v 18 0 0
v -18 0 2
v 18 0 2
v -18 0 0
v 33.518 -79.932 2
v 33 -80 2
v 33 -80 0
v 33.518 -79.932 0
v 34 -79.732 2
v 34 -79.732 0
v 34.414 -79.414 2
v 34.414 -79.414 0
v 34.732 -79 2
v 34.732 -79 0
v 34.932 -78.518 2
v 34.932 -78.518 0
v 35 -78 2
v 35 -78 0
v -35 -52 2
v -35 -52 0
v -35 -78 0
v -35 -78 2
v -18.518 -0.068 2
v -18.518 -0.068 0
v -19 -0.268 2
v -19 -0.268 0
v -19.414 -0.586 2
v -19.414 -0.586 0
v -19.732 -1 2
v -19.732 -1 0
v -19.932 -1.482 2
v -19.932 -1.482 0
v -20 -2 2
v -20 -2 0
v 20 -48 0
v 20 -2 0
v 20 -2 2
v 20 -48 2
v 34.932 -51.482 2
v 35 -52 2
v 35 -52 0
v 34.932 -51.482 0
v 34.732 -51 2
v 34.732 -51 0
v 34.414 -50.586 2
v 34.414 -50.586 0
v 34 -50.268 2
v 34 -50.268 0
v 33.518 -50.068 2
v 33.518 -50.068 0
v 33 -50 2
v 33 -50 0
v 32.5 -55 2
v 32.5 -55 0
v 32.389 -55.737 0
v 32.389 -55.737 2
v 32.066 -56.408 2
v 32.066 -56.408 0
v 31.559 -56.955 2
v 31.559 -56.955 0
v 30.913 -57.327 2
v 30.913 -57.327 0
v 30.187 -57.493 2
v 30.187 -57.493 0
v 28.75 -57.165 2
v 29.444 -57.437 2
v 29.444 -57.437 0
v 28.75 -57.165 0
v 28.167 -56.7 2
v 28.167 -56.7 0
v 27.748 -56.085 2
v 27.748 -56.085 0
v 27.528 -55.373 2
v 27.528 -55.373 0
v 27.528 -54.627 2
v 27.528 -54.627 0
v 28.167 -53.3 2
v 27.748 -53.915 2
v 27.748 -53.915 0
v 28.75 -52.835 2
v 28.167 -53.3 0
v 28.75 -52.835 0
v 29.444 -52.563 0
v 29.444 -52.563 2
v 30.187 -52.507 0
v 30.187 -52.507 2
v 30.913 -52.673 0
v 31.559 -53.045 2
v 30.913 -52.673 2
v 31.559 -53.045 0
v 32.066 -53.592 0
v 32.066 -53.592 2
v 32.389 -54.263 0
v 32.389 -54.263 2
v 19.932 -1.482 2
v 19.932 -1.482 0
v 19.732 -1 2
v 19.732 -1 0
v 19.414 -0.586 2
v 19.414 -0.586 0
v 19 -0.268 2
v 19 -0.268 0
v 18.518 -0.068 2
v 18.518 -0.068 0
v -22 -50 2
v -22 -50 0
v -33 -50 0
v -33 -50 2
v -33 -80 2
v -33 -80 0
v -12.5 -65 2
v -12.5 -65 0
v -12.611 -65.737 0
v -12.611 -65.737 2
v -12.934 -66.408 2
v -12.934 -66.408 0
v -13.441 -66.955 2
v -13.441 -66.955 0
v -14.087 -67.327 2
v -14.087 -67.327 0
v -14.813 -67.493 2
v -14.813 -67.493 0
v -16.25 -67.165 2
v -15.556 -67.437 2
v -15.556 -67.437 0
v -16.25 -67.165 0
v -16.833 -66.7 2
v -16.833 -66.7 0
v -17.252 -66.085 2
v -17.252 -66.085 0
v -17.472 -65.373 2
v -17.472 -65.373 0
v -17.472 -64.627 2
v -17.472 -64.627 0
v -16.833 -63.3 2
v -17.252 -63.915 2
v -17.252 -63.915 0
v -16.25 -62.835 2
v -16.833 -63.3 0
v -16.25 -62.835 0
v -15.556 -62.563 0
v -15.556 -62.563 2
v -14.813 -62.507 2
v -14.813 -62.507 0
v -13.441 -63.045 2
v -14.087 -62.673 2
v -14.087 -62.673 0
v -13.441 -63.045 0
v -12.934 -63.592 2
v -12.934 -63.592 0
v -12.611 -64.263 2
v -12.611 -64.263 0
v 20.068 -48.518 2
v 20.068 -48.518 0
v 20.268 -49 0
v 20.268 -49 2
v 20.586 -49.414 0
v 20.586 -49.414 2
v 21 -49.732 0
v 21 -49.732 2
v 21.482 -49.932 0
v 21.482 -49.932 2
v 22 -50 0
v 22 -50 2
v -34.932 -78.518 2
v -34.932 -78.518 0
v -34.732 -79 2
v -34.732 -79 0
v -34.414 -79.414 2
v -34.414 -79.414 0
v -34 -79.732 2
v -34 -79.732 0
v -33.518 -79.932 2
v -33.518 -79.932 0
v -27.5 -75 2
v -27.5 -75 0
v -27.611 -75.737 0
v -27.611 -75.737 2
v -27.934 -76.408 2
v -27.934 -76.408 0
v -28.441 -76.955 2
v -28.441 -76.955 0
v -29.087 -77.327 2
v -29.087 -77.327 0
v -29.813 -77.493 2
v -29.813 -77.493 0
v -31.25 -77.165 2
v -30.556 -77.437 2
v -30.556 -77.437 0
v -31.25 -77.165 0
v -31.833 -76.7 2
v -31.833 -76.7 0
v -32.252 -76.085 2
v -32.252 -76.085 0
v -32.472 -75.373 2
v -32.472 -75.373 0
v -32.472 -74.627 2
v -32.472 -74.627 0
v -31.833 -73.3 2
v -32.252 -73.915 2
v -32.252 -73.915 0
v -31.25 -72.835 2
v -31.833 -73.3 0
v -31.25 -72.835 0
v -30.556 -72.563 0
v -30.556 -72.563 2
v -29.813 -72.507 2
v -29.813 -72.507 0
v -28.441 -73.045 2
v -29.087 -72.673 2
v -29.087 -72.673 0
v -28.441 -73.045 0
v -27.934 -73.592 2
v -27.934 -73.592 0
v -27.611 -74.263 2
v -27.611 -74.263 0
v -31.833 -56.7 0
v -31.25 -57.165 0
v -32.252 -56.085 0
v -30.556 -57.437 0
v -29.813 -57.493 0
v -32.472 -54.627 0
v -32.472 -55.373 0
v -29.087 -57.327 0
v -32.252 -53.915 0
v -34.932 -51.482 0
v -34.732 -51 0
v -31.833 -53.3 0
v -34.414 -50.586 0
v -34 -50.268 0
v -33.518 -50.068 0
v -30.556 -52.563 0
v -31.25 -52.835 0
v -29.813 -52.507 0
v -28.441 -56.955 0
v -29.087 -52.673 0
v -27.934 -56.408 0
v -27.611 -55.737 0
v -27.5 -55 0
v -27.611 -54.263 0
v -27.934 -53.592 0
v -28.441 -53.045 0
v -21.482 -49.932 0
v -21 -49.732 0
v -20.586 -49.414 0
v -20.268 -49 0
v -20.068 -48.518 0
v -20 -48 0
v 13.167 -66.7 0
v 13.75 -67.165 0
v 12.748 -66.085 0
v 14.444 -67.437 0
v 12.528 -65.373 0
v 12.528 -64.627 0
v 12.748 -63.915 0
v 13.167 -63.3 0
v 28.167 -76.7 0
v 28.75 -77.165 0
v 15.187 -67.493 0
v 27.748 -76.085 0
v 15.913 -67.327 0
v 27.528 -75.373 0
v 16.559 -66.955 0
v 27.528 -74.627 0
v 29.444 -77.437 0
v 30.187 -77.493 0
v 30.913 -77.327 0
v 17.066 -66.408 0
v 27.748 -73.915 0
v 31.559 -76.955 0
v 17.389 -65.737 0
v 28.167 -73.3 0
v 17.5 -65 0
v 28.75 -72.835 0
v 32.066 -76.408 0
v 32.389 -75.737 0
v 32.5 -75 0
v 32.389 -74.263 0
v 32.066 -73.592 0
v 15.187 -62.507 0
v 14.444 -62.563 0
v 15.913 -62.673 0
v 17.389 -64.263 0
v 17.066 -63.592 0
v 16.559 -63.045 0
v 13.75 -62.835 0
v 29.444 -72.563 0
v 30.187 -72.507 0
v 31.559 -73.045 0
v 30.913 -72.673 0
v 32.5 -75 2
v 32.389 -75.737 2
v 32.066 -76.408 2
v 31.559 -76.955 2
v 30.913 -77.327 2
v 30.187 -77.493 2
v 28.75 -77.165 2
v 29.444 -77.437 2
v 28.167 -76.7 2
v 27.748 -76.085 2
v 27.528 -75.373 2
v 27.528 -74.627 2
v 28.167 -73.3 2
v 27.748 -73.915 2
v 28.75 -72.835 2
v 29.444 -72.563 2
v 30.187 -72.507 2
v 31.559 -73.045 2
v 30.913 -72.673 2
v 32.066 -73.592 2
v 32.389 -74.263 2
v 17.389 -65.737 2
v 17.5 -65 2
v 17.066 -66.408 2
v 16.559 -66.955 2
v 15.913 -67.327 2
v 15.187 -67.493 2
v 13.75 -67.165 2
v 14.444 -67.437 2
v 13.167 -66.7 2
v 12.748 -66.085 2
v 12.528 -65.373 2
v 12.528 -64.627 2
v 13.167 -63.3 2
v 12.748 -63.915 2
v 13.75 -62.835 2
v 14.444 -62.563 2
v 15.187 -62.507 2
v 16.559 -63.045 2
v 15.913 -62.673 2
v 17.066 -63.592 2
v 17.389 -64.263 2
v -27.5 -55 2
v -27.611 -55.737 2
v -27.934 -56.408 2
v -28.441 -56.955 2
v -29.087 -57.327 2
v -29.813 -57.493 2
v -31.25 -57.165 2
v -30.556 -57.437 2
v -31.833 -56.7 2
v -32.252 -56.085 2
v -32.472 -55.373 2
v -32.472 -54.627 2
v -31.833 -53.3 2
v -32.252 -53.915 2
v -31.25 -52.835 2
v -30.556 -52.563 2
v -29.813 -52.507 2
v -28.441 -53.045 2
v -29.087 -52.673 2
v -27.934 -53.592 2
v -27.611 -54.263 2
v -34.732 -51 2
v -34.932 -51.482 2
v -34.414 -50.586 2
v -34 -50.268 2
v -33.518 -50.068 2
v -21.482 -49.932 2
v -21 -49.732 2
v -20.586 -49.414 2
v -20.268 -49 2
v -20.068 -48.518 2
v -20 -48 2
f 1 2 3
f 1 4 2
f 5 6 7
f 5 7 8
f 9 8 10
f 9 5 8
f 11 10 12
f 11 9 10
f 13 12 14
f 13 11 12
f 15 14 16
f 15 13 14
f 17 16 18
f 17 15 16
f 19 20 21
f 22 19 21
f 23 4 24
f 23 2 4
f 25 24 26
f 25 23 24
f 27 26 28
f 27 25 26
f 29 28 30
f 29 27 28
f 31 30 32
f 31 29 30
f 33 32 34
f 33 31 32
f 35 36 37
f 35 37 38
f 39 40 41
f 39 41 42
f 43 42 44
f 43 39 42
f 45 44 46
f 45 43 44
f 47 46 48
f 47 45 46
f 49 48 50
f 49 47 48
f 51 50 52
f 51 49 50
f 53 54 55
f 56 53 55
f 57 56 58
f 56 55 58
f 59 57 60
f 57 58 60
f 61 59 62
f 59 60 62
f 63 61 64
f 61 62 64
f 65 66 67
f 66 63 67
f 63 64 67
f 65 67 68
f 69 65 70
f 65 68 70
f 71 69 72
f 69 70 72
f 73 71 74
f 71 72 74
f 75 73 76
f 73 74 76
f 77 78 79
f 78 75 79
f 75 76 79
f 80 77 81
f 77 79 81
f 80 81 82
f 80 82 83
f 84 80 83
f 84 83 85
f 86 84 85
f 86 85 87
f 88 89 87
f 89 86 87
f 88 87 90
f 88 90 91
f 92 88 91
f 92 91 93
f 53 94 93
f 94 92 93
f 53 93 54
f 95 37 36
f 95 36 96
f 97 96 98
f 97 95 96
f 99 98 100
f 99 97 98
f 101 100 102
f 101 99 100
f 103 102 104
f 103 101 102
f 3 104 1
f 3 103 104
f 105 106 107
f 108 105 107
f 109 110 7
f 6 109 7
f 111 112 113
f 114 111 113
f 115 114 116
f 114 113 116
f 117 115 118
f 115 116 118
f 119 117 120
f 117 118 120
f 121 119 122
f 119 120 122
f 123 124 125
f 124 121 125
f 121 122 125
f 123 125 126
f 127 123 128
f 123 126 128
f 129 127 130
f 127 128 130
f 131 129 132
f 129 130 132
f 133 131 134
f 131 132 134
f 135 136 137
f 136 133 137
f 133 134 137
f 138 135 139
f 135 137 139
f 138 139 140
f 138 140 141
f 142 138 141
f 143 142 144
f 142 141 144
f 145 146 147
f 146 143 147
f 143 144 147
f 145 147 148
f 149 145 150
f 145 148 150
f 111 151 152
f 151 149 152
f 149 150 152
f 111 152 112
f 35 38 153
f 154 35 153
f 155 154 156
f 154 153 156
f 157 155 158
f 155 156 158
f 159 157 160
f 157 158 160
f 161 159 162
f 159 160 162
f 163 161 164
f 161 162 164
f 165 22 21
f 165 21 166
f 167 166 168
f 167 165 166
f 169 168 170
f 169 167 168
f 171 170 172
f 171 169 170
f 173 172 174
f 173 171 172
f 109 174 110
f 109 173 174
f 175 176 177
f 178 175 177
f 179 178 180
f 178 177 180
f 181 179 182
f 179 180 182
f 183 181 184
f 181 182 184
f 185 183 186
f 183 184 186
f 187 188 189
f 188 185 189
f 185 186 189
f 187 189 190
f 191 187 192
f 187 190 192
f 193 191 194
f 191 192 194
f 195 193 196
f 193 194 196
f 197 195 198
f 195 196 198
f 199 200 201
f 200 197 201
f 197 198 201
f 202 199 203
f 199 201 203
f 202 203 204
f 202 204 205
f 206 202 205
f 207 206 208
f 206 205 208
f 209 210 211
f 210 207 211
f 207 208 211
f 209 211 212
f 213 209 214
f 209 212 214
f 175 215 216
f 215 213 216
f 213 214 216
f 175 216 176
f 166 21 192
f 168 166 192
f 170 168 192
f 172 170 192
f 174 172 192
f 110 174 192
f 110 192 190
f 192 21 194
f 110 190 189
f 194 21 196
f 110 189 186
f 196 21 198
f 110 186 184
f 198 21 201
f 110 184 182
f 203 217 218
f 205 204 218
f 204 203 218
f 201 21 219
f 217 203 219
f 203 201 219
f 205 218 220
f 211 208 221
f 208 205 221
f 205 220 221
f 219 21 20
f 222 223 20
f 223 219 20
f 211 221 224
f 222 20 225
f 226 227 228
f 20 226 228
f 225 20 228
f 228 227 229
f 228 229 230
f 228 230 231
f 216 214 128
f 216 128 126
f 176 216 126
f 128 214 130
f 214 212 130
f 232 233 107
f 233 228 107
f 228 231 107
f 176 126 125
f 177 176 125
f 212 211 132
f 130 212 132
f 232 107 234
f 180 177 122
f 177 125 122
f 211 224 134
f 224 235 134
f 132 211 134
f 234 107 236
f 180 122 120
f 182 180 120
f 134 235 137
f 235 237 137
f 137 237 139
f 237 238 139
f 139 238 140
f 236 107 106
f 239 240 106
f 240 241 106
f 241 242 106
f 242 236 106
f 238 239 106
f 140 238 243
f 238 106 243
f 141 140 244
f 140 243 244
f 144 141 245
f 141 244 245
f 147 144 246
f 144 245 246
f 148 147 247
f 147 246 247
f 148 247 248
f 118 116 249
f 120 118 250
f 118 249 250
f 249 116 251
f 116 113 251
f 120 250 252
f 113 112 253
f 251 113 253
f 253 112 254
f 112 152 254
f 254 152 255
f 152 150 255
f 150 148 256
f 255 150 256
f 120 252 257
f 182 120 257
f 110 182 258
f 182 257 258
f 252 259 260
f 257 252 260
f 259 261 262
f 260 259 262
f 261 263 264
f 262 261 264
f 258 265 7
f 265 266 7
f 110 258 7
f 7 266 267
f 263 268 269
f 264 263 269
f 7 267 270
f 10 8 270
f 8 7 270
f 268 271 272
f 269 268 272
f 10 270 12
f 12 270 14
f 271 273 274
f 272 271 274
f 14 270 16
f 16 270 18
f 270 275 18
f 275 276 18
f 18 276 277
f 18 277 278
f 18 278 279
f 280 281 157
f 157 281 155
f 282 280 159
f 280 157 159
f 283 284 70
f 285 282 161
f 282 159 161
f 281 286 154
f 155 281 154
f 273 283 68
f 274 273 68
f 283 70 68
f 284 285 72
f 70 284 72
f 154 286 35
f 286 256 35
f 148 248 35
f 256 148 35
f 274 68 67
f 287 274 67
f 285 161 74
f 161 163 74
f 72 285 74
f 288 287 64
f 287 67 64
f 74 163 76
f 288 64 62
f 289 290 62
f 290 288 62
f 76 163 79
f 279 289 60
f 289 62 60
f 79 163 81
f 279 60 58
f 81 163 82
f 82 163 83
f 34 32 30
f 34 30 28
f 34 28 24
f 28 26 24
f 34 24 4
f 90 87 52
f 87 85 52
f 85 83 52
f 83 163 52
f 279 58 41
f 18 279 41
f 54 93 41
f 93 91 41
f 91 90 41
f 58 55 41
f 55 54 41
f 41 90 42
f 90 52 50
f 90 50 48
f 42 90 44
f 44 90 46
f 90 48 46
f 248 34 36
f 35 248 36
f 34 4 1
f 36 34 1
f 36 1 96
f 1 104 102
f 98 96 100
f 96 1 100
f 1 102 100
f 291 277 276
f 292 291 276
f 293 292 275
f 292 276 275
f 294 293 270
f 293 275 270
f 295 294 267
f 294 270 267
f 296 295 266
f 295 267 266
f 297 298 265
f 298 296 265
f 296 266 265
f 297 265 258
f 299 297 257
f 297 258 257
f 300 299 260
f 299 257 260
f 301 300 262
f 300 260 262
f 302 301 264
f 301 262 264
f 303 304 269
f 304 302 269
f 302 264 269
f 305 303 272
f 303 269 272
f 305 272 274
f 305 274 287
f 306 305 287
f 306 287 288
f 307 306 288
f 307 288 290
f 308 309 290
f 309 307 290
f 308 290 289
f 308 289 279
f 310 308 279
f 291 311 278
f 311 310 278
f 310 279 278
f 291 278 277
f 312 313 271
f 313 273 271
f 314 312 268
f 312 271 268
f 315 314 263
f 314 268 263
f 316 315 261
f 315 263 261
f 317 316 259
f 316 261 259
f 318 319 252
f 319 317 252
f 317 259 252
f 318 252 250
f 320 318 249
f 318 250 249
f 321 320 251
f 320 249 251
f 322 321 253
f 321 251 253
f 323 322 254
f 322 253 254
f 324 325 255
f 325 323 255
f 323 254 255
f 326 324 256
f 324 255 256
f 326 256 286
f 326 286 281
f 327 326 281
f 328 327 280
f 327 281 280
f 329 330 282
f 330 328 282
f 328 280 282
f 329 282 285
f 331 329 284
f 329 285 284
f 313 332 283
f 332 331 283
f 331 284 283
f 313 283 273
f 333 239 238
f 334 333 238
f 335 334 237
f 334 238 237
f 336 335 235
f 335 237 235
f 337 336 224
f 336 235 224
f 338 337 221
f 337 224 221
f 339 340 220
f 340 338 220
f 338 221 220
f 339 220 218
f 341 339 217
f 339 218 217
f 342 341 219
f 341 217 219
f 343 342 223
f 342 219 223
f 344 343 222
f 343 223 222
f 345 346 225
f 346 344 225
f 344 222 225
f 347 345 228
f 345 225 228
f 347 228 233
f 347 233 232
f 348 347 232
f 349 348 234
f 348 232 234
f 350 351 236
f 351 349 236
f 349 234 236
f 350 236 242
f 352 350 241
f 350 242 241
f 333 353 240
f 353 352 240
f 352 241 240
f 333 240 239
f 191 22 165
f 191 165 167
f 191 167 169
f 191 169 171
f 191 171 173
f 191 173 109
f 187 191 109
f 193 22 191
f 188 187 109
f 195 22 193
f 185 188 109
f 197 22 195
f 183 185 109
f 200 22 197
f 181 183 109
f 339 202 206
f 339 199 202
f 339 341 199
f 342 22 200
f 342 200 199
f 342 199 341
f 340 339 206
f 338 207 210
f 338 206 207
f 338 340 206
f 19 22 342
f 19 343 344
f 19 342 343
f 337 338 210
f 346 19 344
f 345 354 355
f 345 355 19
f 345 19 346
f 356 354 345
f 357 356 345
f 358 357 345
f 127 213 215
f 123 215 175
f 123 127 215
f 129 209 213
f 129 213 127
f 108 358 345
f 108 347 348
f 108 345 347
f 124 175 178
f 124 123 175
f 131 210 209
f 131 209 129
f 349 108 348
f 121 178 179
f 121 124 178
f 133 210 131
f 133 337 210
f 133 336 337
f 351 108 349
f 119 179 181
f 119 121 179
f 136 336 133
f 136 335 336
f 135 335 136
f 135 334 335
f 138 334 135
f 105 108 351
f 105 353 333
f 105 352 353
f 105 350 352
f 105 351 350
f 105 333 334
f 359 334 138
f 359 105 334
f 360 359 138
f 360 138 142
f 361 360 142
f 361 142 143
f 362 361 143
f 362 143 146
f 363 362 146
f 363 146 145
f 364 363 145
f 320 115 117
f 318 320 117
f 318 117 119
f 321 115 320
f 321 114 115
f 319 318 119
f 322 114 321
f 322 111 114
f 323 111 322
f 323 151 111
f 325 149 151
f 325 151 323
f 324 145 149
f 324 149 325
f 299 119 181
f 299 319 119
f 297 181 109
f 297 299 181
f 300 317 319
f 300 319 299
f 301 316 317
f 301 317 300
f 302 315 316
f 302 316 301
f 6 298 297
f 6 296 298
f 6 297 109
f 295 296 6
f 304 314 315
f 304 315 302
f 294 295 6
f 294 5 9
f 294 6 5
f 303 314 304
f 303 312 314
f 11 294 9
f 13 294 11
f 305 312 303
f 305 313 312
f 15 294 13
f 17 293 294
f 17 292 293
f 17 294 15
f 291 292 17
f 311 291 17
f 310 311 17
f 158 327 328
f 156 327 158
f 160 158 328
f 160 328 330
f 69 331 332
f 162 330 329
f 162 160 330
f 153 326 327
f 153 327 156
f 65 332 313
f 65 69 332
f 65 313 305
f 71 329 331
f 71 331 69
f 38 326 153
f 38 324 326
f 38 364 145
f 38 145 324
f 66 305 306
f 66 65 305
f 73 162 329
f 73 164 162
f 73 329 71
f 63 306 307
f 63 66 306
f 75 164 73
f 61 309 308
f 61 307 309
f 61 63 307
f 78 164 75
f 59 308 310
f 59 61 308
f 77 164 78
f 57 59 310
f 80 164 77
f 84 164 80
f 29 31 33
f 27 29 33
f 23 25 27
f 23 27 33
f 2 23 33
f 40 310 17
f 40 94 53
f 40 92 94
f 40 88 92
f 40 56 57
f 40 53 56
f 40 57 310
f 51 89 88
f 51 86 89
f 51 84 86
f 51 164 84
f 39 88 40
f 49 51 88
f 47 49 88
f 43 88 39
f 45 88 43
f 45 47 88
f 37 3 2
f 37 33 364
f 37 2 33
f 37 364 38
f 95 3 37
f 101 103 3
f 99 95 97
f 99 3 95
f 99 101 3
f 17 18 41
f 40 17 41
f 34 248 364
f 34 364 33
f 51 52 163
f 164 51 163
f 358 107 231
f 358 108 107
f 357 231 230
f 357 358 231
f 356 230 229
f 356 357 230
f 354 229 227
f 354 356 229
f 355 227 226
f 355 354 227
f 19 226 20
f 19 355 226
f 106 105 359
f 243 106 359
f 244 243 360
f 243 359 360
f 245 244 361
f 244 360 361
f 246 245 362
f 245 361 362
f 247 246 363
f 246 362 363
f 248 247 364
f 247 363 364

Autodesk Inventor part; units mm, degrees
ref_plane "YZ Plane" through (0, 0, 0) normal (1, 0, 0) x (0, 1, 0)
ref_plane "XZ Plane" through (0, 0, 0) normal (0, 1, 0) x (-1, 0, 0)
ref_plane "XY Plane" through (0, 0, 0) normal (0, 0, 1) x (1, 0, 0)
sketch "Sketch1" plane through (0, 0, 0) normal (0, 0, 1) x (1, 0, 0)
  line L0 (-20, 0) -> (20, 0)
  line L1 (20, 0) -> (20, -50)
  line L2 (20, -50) -> (-20, -50)
  line L3 (-20, -50) -> (-20, 0)
  line L4 (-35, -80) -> (35, -80)
  line L5 (35, -80) -> (35, -50)
  line L6 (35, -50) -> (-35, -50)
  line L7 (-35, -50) -> (-35, -80)
  circle A0 centre (-15, -65) radius 2.5
  circle A1 centre (15, -65) radius 2.5
  line L8 (0, -80) -> (0, -50) construction
  circle A2 centre (-30, -55) radius 2.5
  circle A3 centre (30, -55) radius 2.5
  circle A4 centre (30, -75) radius 2.5
  circle A5 centre (-30, -75) radius 2.5
  line L9 (-35, -65) -> (35, -65) construction
  point P0 (0, 0)
  point P1 (0, 0)
  dimension "d0" = 40
  dimension "d1" = 50
  dimension "d33" = 70
  dimension "d34" = 5
  dimension "d35" = 30
  dimension "d36" = 30
  dimension "d38" = 5
  dimension "d39" = 5
extrude "Plate1" add sketch "Sketch1" along normal blind 2
fillet "Corner Round1" radius 2 8 edges at (-20, -50, 1) (-35, -50, 1) (20, -50, 1) (35, -50, 1) (35, -80, 1) (-35, -80, 1) (-20, 0, 1) (20, 0, 1)
equation "\"d2\" = Thickness"
equation "\"BendReliefWidth\" = Thickness"
equation "\"BendReliefDepth\" = 0.5 * Thickness"
equation "\"CornerReliefSize\" = 4 * Thickness"
equation "\"MinimumRemnant\" = 2 * Thickness"
equation "\"TransitionRadius\" = BendRadius"
equation "\"JacobiRadiusSize\" = BendRadius"
equation "\"GapSize\" = Thickness"
equation "\"Thickness\" = 2"
equation "\"BendRadius\" = 2.75"
properties part number "NDM 11.030 plate" material "Stainless Steel"
